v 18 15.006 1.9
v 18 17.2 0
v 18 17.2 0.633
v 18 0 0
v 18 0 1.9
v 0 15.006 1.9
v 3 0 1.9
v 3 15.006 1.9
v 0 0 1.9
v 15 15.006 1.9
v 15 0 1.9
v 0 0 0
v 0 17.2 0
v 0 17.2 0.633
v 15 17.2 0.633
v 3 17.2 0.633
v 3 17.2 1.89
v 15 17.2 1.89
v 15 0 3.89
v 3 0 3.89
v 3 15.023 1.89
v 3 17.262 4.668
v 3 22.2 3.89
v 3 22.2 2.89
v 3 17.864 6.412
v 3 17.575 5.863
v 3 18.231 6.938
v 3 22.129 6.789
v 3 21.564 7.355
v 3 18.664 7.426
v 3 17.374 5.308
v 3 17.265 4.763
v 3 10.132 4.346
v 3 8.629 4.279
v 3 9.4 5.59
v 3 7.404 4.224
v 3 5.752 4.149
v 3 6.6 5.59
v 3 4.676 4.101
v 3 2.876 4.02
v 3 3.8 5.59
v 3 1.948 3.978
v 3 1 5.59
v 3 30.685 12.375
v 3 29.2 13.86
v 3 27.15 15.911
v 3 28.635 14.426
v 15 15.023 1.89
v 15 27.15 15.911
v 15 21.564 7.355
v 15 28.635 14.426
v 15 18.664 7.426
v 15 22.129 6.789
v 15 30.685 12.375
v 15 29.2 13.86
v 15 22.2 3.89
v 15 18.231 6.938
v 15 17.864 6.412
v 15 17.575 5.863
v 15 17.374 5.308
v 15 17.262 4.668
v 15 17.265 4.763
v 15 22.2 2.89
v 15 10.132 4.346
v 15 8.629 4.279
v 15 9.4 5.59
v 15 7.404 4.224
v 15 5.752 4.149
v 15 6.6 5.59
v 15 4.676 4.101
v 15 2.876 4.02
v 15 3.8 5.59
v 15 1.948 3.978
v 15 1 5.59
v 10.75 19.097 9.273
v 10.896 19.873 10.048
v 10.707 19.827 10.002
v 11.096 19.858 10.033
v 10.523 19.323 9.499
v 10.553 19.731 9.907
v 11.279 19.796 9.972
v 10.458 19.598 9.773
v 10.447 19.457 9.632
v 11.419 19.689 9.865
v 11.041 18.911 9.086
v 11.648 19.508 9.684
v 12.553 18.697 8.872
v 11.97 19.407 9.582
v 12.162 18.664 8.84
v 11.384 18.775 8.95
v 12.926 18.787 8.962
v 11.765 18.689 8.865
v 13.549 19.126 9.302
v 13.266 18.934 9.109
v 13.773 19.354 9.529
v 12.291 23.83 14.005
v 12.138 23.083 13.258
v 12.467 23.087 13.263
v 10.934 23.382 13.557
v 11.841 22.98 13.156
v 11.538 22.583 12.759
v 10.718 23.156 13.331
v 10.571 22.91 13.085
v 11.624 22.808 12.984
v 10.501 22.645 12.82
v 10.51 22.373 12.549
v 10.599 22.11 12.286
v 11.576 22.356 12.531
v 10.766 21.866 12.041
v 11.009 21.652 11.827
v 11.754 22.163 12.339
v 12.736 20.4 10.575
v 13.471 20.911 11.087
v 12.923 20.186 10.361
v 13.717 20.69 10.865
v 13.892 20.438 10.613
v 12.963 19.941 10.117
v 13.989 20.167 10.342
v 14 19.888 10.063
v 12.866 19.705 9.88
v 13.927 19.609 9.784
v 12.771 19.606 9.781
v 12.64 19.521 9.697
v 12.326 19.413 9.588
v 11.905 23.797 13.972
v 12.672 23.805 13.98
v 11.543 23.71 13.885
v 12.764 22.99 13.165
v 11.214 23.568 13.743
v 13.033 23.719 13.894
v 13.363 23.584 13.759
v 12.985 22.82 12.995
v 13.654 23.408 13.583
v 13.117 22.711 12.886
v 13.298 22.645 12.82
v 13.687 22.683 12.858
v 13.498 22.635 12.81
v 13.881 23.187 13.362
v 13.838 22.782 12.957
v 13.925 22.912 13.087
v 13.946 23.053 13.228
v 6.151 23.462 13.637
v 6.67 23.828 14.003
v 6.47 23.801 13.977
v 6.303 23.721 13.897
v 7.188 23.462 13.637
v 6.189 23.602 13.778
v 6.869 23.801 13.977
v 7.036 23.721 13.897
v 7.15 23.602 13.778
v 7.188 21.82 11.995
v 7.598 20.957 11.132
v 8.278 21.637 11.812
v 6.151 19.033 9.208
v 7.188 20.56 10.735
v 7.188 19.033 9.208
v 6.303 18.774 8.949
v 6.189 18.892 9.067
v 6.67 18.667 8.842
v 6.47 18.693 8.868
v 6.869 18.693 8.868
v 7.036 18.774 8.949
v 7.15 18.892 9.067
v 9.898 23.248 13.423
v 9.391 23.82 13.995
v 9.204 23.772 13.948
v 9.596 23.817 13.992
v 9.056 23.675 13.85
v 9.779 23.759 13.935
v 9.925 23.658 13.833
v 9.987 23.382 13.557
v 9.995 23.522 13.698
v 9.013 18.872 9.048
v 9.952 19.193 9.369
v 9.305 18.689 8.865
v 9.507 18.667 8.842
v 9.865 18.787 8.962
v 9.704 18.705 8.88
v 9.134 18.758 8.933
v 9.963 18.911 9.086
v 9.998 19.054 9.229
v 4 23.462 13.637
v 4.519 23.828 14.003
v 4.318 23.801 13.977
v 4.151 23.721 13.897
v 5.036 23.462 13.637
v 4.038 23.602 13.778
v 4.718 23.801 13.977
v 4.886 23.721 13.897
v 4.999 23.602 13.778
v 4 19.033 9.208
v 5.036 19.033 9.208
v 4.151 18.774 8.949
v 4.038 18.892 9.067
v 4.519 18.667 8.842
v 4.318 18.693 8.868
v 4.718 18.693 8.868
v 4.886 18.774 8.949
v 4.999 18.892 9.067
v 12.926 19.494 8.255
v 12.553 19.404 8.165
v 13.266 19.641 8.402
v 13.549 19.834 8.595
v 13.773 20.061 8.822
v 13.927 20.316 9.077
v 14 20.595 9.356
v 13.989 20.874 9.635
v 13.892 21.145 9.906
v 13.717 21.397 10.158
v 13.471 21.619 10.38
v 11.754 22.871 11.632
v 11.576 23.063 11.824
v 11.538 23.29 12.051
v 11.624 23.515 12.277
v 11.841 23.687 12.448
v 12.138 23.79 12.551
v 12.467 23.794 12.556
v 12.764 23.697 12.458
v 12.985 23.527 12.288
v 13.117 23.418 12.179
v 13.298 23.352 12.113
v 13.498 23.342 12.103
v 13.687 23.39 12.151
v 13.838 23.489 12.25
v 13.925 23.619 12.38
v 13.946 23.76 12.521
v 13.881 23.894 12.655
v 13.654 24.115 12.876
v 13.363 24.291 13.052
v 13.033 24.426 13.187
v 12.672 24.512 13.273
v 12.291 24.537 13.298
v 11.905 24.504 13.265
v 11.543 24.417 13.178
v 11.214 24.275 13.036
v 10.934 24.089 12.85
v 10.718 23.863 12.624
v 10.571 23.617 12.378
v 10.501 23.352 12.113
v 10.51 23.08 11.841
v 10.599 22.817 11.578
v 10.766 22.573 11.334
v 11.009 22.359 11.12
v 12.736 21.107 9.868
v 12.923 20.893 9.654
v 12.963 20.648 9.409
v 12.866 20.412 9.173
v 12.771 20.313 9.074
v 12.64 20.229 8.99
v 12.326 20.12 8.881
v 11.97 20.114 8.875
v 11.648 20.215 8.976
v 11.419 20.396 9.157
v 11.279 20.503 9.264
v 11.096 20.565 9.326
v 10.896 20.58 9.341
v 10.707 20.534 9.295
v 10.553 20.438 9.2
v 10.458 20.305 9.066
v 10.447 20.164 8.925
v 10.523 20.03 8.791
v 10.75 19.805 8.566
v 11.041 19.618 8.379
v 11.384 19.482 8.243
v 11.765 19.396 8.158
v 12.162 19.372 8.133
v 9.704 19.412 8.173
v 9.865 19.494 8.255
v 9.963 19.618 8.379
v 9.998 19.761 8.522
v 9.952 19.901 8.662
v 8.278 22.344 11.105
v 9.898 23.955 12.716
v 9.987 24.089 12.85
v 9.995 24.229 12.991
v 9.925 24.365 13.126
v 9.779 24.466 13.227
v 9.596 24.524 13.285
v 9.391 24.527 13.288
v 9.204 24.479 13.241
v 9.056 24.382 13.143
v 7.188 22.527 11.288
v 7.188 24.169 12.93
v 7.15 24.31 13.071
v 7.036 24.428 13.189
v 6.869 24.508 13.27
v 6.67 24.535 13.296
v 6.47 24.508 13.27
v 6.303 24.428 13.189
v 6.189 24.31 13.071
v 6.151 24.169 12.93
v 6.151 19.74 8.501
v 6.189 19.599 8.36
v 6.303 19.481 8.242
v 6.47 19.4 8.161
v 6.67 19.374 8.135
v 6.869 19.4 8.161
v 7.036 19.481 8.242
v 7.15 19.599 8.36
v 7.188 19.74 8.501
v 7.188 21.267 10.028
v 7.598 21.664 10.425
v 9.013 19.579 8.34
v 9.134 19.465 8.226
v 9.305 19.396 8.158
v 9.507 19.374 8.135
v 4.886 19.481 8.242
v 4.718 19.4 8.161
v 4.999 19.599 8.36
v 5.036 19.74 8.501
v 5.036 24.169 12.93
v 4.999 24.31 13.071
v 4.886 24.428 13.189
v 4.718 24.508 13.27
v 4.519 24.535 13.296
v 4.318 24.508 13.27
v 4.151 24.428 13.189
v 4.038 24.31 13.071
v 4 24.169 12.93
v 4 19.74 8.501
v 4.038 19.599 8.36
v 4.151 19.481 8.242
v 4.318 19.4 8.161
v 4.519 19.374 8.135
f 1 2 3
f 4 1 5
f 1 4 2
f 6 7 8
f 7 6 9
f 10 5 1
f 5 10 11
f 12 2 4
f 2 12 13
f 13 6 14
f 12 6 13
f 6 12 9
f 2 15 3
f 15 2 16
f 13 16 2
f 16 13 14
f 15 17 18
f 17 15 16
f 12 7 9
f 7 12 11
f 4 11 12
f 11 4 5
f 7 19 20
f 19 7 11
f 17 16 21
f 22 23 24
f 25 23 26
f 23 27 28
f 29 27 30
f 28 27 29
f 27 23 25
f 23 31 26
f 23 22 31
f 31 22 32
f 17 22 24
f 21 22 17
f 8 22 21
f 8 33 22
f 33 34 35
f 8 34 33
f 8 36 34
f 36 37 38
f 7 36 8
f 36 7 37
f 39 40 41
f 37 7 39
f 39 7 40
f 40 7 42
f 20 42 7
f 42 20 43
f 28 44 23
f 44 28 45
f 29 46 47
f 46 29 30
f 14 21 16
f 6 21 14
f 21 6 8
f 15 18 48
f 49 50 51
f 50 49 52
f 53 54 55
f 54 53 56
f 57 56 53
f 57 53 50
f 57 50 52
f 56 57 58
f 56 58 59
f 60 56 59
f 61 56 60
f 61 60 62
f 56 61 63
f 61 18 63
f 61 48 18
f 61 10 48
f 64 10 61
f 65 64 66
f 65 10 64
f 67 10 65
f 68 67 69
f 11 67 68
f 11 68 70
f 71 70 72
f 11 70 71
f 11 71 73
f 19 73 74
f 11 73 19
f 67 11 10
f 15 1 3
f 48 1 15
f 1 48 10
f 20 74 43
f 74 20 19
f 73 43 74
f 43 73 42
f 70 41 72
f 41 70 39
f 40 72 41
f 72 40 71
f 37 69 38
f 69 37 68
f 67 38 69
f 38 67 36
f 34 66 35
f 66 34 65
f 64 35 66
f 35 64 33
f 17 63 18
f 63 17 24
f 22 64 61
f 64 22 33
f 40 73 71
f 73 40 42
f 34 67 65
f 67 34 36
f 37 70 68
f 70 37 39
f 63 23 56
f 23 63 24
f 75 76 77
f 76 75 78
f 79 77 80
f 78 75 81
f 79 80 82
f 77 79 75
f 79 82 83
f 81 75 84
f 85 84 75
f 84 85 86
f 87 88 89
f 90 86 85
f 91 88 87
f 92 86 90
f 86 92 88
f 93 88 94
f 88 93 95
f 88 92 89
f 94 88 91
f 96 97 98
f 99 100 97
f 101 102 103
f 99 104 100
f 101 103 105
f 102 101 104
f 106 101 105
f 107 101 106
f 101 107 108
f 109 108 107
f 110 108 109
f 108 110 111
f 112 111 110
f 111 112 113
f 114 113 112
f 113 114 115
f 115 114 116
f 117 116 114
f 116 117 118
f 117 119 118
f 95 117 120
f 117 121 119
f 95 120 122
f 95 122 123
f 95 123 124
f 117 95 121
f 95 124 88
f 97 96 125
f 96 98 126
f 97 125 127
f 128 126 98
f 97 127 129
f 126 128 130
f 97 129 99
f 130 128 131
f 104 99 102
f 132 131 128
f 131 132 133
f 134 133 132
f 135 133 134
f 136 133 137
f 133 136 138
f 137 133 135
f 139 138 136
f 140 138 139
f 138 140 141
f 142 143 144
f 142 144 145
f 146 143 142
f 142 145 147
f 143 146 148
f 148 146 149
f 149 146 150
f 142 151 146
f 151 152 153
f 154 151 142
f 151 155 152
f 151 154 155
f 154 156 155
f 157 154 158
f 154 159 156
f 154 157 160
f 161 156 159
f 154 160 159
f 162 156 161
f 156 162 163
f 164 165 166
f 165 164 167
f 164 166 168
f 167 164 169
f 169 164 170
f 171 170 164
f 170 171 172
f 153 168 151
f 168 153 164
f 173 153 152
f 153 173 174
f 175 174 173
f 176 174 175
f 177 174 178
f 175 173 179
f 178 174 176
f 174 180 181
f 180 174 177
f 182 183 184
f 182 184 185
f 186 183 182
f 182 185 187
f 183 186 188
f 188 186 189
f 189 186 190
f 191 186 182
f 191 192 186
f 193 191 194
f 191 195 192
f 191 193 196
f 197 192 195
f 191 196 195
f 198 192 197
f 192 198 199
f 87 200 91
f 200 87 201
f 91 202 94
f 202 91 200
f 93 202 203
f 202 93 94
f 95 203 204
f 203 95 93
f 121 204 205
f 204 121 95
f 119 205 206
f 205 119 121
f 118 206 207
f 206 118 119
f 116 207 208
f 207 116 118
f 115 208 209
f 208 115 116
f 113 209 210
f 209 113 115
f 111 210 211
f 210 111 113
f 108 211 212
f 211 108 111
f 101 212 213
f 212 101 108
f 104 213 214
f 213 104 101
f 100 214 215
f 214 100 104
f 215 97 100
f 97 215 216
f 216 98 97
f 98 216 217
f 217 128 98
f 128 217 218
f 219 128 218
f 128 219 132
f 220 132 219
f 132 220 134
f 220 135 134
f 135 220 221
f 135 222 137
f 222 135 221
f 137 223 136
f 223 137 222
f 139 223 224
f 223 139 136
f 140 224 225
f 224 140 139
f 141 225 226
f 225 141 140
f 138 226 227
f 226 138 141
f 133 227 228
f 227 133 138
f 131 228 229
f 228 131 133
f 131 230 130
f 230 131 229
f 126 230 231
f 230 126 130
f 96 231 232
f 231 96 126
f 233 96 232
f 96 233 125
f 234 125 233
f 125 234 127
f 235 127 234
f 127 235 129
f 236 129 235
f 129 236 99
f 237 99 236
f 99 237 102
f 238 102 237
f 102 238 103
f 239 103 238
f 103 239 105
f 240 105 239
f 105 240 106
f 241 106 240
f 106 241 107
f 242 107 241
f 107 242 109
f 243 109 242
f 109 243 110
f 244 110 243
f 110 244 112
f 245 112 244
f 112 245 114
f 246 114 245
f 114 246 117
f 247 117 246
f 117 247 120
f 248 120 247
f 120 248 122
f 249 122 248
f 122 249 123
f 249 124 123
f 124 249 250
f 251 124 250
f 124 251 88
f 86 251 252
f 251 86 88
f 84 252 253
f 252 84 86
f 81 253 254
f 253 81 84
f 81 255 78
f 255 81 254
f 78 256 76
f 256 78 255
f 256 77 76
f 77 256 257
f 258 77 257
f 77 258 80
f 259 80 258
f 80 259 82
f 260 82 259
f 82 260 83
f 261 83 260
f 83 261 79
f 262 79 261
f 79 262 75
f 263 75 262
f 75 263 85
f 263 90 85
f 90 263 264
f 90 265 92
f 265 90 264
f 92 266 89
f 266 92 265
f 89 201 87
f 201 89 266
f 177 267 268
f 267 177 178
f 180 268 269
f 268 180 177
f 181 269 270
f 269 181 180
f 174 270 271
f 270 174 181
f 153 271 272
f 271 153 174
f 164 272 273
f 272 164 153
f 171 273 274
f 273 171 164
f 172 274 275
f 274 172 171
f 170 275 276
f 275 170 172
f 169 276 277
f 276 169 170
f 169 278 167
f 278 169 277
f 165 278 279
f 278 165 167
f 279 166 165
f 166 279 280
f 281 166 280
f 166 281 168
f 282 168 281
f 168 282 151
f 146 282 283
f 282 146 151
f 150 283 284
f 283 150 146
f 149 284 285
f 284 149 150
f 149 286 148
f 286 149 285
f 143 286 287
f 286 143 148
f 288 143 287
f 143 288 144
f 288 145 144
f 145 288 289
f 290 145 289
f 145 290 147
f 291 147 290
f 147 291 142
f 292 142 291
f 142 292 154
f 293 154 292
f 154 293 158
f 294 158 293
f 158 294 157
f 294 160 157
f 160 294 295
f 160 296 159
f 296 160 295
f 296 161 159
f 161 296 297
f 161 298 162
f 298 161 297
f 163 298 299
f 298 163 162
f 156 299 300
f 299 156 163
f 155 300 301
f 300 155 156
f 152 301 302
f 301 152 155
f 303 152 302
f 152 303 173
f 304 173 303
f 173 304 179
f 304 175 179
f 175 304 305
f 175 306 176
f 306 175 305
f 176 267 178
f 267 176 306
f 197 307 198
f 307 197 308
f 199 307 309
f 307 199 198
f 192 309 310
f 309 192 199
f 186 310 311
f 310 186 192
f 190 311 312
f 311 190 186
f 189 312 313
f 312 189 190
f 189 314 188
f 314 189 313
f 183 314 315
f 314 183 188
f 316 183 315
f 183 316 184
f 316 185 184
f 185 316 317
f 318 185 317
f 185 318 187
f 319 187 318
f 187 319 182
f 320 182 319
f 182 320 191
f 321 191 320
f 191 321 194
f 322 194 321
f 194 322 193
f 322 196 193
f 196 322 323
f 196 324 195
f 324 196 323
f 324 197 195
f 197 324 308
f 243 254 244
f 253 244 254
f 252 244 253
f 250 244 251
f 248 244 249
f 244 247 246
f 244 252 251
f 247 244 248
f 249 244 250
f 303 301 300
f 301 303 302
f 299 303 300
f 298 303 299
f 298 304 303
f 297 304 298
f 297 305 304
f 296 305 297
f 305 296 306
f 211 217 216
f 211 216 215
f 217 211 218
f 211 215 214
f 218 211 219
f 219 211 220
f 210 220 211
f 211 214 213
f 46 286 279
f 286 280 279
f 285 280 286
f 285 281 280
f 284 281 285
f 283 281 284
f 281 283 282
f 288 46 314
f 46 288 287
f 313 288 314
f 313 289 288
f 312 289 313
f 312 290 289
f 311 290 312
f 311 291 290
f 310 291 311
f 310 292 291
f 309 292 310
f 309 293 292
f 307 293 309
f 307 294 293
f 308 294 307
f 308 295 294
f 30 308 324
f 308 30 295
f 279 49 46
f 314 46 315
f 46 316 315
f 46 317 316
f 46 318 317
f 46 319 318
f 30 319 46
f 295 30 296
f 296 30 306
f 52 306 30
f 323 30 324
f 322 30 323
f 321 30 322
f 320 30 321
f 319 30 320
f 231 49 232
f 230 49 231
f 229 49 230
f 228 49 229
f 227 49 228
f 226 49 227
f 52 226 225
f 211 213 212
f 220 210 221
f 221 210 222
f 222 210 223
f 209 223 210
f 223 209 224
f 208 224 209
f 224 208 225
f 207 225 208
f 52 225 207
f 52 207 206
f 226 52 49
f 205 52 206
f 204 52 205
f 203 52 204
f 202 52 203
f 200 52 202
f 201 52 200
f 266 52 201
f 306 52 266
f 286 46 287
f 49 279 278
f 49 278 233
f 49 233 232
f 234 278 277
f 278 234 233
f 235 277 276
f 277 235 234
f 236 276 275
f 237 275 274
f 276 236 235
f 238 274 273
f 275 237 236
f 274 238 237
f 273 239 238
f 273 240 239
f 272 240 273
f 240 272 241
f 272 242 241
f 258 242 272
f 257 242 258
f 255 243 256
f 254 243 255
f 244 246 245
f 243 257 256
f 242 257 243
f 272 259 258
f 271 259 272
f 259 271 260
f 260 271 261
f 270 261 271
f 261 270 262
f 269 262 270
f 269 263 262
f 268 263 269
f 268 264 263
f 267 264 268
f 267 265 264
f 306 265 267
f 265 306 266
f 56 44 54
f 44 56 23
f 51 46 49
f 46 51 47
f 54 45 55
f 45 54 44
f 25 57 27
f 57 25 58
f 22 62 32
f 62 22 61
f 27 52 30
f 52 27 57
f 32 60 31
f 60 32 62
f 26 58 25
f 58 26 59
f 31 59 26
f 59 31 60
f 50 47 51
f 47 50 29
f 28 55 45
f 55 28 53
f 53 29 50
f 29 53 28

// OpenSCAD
// file: hotshoe_paper_clip.scad
hs_w      = 18.0;
hs_l      = 17.2;
hs_h      = 1.9; // 2
hs2_w     = 12;
//hs2_l     = hs_l+5;
hs2_h     = 2;
hs2_x_off = (hs_w-hs2_w)/2;
hs2_elev  = 1;
hs3_l     = 12;
hs3_h     = 5;
hs3_w     = 0.8;

module hotshoe(
    logofile="", logooffset=1,
    len=5
    ) {
    hs2_l = hs_l+len;
    union() {
        // lower hotshoe
        difference() {
            cube([hs_w, hs_l, hs_h]);
            translate([-1,hs_l,hs_h/3]) rotate([60,0,0]) cube([hs2_x_off+1, 10,10]);
            translate([hs2_x_off+hs2_w,hs_l,hs_h/3]) rotate([60,0,0]) cube([hs2_x_off+1, 10,10]);
        }
        // upper plate including grip
        translate([hs2_x_off, 0, hs_h-0.01]) {
            rotate([90,0,90])
            linear_extrude(height=hs2_w) {
                polygon(
                points=[[0,0], [hs2_l,0], [hs_l,0], [hs2_l,hs2_elev],[hs2_l,hs2_elev+hs2_h],
                //[hs_l,hs2_h],
                [0,hs2_h]],
                paths=[[0,1,2,3,4,5,6]]
                );
            }
            for ( i = [0:3]) {
                translate([hs2_w/2,1+2.8*(i),hs2_h]) scale([1,1,1.7]) rotate([45,0,0]) cube([hs2_w,sqrt(2), sqrt(2)], center=true);
            }
        }
        translate([hs2_x_off, hs2_l, hs_h+hs2_elev+hs2_h/2-0.01])
        rotate([45,0,0])
        difference() {
            union() {
                // Logo
                translate([logooffset,1,hs3_h-1]) linear_extrude(height=1+1) import(file=logofile);
                // clasp
                cube([hs2_w, hs3_l, hs3_h]);
                translate([0,0,hs3_h/2]) scale([1,1.5,1]) rotate([0,90,0]) cylinder(h=hs2_w, r=hs3_h/2, $fn=36);
            }
            translate([-1,2,(hs3_h-hs3_w)/2]) cube([hs2_w+2, hs3_l, hs3_w]);
        }
    }
}
// main file
include <hotshoe_paper_clip.scad>

hotshoe(logofile="IKS.dxf", logooffset=1);
